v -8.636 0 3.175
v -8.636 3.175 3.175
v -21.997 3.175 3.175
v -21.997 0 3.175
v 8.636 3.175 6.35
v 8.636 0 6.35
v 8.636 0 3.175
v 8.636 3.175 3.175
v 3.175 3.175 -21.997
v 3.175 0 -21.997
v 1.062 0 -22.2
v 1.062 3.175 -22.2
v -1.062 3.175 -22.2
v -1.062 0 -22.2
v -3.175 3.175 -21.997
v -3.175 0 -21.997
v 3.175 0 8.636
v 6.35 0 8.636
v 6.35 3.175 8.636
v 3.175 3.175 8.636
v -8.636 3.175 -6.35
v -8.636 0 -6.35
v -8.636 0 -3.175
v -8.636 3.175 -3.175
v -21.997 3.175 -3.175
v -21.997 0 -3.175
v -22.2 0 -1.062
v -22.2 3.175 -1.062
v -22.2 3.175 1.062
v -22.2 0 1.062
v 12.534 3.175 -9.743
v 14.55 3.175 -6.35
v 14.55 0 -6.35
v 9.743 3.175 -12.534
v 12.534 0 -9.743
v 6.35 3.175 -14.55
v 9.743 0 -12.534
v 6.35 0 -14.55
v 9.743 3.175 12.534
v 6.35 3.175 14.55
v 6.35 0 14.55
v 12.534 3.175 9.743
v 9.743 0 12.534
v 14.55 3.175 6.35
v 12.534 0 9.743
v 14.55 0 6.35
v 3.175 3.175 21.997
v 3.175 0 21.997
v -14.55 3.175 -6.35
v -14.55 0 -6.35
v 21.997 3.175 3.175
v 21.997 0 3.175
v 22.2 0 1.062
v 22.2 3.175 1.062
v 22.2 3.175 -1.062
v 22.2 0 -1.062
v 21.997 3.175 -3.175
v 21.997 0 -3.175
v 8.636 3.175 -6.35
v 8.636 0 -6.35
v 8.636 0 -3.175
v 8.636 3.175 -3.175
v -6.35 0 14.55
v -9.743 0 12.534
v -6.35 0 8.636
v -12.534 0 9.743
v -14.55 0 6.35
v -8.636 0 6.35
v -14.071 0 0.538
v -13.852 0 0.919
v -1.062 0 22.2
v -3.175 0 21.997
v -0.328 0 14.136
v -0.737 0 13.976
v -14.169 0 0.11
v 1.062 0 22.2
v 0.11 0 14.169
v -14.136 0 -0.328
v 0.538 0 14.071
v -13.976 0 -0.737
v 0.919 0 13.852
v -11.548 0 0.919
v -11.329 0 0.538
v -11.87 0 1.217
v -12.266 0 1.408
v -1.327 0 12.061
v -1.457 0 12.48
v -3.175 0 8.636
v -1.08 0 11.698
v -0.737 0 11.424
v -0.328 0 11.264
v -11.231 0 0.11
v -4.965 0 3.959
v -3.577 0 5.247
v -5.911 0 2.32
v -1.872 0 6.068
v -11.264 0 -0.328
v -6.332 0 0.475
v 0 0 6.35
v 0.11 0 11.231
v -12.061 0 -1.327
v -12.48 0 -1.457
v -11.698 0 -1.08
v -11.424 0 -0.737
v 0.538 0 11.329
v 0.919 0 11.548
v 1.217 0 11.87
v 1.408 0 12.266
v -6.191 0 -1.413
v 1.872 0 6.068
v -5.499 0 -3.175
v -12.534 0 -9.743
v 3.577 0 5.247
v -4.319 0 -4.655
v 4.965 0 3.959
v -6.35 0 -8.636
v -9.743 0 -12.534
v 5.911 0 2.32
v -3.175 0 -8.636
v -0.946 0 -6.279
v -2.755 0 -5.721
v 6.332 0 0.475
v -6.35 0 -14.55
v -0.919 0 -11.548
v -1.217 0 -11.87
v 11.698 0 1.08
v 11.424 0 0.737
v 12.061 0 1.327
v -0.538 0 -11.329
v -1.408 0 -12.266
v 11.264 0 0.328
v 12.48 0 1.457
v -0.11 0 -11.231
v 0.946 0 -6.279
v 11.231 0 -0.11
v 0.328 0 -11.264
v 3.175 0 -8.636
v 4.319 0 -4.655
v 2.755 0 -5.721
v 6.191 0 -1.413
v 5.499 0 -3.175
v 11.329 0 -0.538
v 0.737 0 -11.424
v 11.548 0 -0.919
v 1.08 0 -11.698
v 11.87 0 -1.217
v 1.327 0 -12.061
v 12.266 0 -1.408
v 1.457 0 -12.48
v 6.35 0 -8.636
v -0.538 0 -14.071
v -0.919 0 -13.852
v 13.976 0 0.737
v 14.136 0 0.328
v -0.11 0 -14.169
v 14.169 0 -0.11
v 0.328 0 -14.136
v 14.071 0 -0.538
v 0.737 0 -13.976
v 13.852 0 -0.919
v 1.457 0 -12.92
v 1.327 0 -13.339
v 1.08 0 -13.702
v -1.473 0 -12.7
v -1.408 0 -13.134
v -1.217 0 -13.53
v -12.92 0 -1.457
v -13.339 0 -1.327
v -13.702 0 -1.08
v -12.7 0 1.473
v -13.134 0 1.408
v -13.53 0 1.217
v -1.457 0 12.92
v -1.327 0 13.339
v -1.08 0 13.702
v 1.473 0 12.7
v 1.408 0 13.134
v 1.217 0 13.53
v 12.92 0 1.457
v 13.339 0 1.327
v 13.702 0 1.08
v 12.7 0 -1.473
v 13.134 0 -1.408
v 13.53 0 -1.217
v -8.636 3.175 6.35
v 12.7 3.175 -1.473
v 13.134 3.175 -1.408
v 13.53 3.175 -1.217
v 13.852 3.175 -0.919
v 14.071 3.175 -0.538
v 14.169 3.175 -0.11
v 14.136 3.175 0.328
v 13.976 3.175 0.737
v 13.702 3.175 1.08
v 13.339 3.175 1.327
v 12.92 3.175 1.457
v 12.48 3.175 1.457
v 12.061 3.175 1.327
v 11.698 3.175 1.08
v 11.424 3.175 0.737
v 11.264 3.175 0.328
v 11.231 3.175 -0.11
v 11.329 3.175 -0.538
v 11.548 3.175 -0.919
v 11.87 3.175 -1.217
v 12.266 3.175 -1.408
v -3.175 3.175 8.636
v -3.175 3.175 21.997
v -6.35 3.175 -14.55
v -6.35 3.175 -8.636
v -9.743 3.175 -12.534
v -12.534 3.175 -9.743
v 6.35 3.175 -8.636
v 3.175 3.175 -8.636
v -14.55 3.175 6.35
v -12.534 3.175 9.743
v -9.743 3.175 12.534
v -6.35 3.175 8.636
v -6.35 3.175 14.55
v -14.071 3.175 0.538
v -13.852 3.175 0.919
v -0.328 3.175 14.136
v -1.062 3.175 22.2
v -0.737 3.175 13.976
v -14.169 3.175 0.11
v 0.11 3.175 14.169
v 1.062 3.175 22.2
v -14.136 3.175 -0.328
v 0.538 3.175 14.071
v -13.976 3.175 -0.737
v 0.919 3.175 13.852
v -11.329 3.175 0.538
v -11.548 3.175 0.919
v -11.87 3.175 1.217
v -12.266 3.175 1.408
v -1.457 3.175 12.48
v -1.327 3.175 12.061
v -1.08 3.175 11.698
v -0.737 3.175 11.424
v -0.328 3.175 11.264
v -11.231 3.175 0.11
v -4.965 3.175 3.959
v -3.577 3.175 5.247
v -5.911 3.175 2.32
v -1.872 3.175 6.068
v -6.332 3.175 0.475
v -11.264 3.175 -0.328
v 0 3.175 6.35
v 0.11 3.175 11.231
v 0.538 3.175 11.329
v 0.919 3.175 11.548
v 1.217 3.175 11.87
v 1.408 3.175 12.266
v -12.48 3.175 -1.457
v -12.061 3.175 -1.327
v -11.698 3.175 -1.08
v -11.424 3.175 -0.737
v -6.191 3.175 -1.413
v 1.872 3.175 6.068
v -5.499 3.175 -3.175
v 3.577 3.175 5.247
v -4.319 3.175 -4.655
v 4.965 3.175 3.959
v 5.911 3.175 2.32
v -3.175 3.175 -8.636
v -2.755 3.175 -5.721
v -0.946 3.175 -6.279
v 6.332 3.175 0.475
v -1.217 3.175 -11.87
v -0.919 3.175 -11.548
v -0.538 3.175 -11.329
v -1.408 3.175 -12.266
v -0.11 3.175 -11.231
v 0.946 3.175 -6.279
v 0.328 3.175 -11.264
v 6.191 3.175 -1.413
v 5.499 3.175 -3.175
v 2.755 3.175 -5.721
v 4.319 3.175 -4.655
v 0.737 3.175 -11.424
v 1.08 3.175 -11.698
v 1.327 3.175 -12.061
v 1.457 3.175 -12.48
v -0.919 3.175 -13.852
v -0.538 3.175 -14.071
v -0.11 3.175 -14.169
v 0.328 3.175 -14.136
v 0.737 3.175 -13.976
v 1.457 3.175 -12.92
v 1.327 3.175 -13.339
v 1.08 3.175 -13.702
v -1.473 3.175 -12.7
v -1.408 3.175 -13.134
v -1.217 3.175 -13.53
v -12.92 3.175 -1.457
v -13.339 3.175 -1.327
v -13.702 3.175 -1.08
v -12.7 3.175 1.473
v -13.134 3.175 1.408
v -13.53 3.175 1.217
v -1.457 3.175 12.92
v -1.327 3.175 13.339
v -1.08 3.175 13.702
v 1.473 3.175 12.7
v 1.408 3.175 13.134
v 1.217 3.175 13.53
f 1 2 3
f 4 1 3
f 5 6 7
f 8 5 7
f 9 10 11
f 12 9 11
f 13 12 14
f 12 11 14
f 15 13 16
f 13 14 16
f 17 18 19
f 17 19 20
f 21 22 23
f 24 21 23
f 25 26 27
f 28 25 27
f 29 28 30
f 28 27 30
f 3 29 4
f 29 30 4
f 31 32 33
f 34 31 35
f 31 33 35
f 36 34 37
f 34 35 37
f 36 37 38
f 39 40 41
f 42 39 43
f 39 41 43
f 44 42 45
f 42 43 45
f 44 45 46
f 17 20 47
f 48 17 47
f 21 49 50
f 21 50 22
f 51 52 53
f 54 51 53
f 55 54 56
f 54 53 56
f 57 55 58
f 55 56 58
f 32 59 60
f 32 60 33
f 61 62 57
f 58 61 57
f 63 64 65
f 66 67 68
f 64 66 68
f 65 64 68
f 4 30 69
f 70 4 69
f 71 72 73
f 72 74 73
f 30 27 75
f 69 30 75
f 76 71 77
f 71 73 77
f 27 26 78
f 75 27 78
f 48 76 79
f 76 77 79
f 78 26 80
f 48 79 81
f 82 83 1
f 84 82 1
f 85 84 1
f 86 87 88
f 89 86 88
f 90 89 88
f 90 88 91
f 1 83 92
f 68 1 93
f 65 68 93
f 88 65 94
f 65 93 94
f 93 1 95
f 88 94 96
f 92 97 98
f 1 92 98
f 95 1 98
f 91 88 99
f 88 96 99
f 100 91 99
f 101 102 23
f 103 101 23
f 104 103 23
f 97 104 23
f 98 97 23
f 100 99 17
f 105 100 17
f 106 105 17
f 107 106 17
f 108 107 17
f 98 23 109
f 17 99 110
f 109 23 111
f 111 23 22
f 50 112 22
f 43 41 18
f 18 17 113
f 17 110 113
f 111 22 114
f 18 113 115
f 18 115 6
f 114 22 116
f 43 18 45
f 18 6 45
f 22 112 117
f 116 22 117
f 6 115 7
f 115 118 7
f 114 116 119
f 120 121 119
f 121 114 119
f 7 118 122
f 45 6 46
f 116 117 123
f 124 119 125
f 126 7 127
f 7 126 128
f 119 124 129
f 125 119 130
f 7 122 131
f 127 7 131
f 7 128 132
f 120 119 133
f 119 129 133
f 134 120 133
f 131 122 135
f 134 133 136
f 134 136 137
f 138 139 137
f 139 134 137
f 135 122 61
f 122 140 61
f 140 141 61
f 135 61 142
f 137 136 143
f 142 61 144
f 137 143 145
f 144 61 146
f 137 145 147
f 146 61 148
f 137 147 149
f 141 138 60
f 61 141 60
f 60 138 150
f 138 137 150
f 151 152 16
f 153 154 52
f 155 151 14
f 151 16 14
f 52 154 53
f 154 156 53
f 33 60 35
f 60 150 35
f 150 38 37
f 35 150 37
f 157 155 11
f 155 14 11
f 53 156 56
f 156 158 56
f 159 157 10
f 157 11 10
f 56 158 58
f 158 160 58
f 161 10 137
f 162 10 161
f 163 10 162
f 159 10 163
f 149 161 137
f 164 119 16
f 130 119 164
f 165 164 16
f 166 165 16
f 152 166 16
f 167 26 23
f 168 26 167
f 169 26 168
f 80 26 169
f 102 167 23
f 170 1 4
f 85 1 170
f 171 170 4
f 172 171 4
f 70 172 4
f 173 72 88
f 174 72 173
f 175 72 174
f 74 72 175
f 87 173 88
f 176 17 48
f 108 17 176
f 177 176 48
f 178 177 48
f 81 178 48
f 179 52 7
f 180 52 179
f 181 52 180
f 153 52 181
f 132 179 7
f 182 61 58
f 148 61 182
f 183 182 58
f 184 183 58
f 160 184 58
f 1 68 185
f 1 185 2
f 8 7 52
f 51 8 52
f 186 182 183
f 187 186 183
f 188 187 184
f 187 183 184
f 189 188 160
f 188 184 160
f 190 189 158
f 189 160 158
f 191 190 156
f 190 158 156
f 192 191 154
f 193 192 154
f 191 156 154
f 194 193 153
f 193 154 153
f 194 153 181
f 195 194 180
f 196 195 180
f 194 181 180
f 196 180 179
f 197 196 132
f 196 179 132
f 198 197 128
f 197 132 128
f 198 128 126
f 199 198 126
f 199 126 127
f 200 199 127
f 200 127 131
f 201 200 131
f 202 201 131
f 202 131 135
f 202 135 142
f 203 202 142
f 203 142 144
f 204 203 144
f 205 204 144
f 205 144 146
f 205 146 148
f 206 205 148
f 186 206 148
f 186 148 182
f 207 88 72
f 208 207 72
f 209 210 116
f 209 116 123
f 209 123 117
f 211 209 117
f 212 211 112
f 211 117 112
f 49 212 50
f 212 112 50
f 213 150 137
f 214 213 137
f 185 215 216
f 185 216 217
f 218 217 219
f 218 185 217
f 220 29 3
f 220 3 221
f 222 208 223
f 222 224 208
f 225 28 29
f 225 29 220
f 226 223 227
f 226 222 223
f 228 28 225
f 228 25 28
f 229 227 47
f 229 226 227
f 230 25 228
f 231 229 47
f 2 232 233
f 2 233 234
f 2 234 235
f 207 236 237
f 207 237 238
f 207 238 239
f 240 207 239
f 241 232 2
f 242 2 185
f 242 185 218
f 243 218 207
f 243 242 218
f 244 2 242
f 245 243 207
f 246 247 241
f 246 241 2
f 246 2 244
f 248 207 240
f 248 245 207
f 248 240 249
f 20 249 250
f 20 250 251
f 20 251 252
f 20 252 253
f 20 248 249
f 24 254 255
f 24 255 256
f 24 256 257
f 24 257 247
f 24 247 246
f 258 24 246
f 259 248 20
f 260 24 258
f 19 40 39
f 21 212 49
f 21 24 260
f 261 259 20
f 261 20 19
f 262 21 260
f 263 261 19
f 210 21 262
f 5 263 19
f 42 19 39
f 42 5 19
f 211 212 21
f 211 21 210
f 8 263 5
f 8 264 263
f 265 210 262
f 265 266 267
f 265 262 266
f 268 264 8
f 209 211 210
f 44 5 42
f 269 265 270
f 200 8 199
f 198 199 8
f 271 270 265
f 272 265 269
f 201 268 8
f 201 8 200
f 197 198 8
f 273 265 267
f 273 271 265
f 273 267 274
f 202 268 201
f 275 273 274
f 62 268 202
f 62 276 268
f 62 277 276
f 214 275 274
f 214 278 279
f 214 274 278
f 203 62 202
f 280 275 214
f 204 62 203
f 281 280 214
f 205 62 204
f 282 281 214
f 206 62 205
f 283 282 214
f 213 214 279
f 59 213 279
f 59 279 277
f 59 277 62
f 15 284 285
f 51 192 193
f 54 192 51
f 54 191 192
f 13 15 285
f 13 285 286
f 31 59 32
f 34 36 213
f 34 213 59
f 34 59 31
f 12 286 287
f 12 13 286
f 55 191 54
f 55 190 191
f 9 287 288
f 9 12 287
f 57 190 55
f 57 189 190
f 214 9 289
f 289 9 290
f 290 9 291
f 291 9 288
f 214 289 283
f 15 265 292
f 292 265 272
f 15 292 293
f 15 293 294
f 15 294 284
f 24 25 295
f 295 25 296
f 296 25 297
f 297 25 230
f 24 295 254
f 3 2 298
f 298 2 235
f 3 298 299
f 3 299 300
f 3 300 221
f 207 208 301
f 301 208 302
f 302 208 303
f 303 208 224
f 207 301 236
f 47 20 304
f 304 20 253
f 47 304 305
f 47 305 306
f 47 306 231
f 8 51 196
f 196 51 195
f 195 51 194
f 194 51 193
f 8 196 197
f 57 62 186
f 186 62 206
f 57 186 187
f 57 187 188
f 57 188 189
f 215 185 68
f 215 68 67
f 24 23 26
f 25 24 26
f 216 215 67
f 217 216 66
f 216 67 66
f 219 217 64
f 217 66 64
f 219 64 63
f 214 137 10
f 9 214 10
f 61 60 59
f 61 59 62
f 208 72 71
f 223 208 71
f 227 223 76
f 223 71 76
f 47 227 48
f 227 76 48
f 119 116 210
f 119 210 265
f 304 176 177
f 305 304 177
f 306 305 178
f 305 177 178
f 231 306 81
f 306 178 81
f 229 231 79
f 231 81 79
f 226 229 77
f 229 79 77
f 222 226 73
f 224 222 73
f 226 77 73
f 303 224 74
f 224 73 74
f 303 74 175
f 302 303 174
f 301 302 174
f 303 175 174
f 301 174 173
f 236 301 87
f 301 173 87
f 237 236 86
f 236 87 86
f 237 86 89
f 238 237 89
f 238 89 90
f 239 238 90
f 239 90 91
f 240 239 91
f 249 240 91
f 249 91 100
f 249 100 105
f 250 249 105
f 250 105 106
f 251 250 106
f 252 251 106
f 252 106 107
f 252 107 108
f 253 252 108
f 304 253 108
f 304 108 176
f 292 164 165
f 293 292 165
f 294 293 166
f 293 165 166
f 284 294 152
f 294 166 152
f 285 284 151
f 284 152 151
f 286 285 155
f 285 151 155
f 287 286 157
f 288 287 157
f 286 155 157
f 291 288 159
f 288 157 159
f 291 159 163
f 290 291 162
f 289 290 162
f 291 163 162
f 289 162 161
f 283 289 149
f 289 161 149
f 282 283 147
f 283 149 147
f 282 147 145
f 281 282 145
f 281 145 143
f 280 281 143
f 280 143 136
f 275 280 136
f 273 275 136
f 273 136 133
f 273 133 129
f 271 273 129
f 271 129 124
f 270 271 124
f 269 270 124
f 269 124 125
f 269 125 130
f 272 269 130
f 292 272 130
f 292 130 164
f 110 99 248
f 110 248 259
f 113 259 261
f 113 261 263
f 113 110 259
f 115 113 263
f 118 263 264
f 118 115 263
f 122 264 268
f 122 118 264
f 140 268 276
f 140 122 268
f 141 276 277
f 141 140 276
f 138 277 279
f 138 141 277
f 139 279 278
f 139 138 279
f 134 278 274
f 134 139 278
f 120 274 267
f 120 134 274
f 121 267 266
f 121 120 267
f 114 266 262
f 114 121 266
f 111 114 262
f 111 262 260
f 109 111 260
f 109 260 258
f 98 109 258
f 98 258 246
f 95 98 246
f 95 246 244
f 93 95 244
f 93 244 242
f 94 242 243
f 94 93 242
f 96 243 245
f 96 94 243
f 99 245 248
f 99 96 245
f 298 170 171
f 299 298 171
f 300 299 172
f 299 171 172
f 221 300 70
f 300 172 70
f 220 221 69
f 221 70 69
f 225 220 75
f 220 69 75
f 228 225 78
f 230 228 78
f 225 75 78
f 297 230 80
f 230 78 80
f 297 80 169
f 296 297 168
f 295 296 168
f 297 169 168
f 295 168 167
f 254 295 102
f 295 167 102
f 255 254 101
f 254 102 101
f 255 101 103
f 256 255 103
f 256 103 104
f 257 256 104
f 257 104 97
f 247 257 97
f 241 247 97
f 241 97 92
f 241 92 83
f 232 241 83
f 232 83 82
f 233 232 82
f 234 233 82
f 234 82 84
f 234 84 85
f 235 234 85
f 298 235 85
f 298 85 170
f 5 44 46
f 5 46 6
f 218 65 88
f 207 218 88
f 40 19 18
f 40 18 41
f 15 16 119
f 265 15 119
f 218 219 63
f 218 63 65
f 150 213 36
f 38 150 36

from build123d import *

# Parameters (mm, degrees)
SKETCH1_R                   = 6.35
BOSS_EXTRUDE1_DEPTH         = 3.175
F_4_CLEARANCE_HOLE1_D       = 2.9464
CUT_EXTRUDE1_REACH          = 33.591
SKETCH11_W                  = 3.175
SKETCH11_H                  = 6.918259867
CIRPATTERN2_COUNT           = 4
CIRPATTERN2_COPY_1_REACH    = 33.591
CIRPATTERN2_COPY_1_SKETCH_W = 3.175
CIRPATTERN2_COPY_1_SKETCH_H = 6.918259867
CIRPATTERN2_COPY_2_REACH    = 33.591
CIRPATTERN2_COPY_2_SKETCH_W = 3.175
CIRPATTERN2_COPY_2_SKETCH_H = 6.918259867
CIRPATTERN2_COPY_3_REACH    = 33.591
CIRPATTERN2_COPY_3_SKETCH_W = 3.175
CIRPATTERN2_COPY_3_SKETCH_H = 6.918259867
CIRPATTERN2_COPY_4_REACH    = 33.591
CIRPATTERN2_COPY_4_SKETCH_W = 3.175
CIRPATTERN2_COPY_4_SKETCH_H = 6.918259867
CIRPATTERN2_COPY_5_REACH    = 33.591
CIRPATTERN2_COPY_5_SKETCH_W = 3.175
CIRPATTERN2_COPY_5_SKETCH_H = 6.918259867
CIRPATTERN2_COPY_6_REACH    = 33.591
CIRPATTERN2_COPY_6_SKETCH_W = 3.175
CIRPATTERN2_COPY_6_SKETCH_H = 6.918259867


with BuildPart() as part:
    # Sketch1 → Boss-Extrude1 (new body)
    with BuildSketch(Plane(origin=(0, 0, 0), x_dir=(1, 0, 0), z_dir=(0, 1, 0))):
        with BuildLine():
            Line((-3.175, 21.997045256), (-3.175, 15.554259867))
            ThreePointArc((-3.175, 15.554259867), (-11.225320151, 11.225320151), (-15.554259867, 3.175))
            Line((-15.554259867, 3.175), (-21.997045256, 3.175))
            ThreePointArc((-21.997045256, 3.175), (-22.225, 0), (-21.997045256, -3.175))
            Line((-21.997045256, -3.175), (-15.554259867, -3.175))
            ThreePointArc((-15.554259867, -3.175), (-11.225320151, -11.225320151), (-3.175, -15.554259867))
            Line((-3.175, -15.554259867), (-3.175, -21.997045256))
            ThreePointArc((-3.175, -21.997045256), (0, -22.225), (3.175, -21.997045256))
            Line((3.175, -21.997045256), (3.175, -15.554259867))
            ThreePointArc((3.175, -15.554259867), (11.225320151, -11.225320151), (15.554259867, -3.175))
            Line((15.554259867, -3.175), (21.997045256, -3.175))
            ThreePointArc((21.997045256, -3.175), (22.225, 0), (21.997045256, 3.175))
            Line((21.997045256, 3.175), (15.554259867, 3.175))
            ThreePointArc((15.554259867, 3.175), (11.225320151, 11.225320151), (3.175, 15.554259867))
            Line((3.175, 15.554259867), (3.175, 21.997045256))
            ThreePointArc((3.175, 21.997045256), (0, 22.225), (-3.175, 21.997045256))
        make_face()
        with Locations(Location((0, 0, 0), (0, 0, 270))):
            Circle(SKETCH1_R, mode=Mode.SUBTRACT)
    extrude(amount=BOSS_EXTRUDE1_DEPTH)

    # #4 Clearance Hole1 (through all)
    with Locations(Plane(origin=(-5.152902703, 3.175, -13.741681739), x_dir=(1, 0, 0), z_dir=(0, 1, 0))):
        with Locations((5.152902703, -1.041681739)):
            f_4_clearance_hole1 = Hole(F_4_CLEARANCE_HOLE1_D / 2)

    # Sketch11 → Cut-Extrude1 (cut, up to next)
    with BuildSketch(Plane(origin=(0, 3.175, 0), x_dir=(1, 0, 0), z_dir=(0, 1, 0)), mode=Mode.PRIVATE) as cut_extrude1_sk1:
        with Locations((-4.7625, 12.095129934)):
            Rectangle(SKETCH11_W, SKETCH11_H)
    cut_extrude1_tool1 = extrude(cut_extrude1_sk1.sketch, amount=-CUT_EXTRUDE1_REACH, mode=Mode.PRIVATE) & part.part
    cut_extrude1 = cut_extrude1_tool1.solids().sort_by_distance((-4.7625, 3.175, -12.09513))[0]
    add(cut_extrude1, mode=Mode.SUBTRACT)

    # Mirror1: Cut-Extrude1 across plane
    add(cut_extrude1.mirror(Plane(origin=(0, 0, 0), x_dir=(0, 0, 1), z_dir=(1, 0, 0))), mode=Mode.SUBTRACT)

    # CirPattern2: #4 Clearance Hole1 ×4 about axis
    cirpattern2_axis = Axis((0, 0, 0), (0, 1, 0))
    for i in range(1, CIRPATTERN2_COUNT):
        add(f_4_clearance_hole1.rotate(cirpattern2_axis, i * 360 / CIRPATTERN2_COUNT), mode=Mode.SUBTRACT)

    # CirPattern2 copy 1 sketch → CirPattern2 copy 1 (cut, up to next)
    with BuildSketch(Plane.ZX.offset(3.175), mode=Mode.PRIVATE) as cirpattern2_copy_1_sk1:
        with Locations((-4.7625, -12.095129934)):
            Rectangle(CIRPATTERN2_COPY_1_SKETCH_W, CIRPATTERN2_COPY_1_SKETCH_H)
    cirpattern2_copy_1_tool1 = extrude(cirpattern2_copy_1_sk1.sketch, amount=-CIRPATTERN2_COPY_1_REACH, mode=Mode.PRIVATE) & part.part
    add(cirpattern2_copy_1_tool1.solids().sort_by_distance((-12.09513, 3.175, -4.7625))[0], mode=Mode.SUBTRACT)

    # CirPattern2 copy 2 sketch → CirPattern2 copy 2 (cut, up to next)
    with BuildSketch(Plane(origin=(0, 3.175, 0), x_dir=(1, 0, 0), z_dir=(0, 1, 0)), mode=Mode.PRIVATE) as cirpattern2_copy_2_sk1:
        with Locations((-4.7625, -12.095129934)):
            Rectangle(CIRPATTERN2_COPY_2_SKETCH_W, CIRPATTERN2_COPY_2_SKETCH_H)
    cirpattern2_copy_2_tool1 = extrude(cirpattern2_copy_2_sk1.sketch, amount=-CIRPATTERN2_COPY_2_REACH, mode=Mode.PRIVATE) & part.part
    add(cirpattern2_copy_2_tool1.solids().sort_by_distance((-4.7625, 3.175, 12.09513))[0], mode=Mode.SUBTRACT)

    # CirPattern2 copy 3 sketch → CirPattern2 copy 3 (cut, up to next)
    with BuildSketch(Plane(origin=(0, 3.175, 0), x_dir=(0, 0, -1), z_dir=(0, 1, 0)), mode=Mode.PRIVATE) as cirpattern2_copy_3_sk1:
        with Locations((-4.7625, -12.095129934)):
            Rectangle(CIRPATTERN2_COPY_3_SKETCH_W, CIRPATTERN2_COPY_3_SKETCH_H)
    cirpattern2_copy_3_tool1 = extrude(cirpattern2_copy_3_sk1.sketch, amount=-CIRPATTERN2_COPY_3_REACH, mode=Mode.PRIVATE) & part.part
    add(cirpattern2_copy_3_tool1.solids().sort_by_distance((12.09513, 3.175, 4.7625))[0], mode=Mode.SUBTRACT)

    # CirPattern2 copy 4 sketch → CirPattern2 copy 4 (cut, up to next)
    with BuildSketch(Plane(origin=(0, 3.175, 0), x_dir=(0, 0, -1), z_dir=(0, 1, 0)), mode=Mode.PRIVATE) as cirpattern2_copy_4_sk1:
        with Locations((-4.7625, 12.095129934)):
            Rectangle(CIRPATTERN2_COPY_4_SKETCH_W, CIRPATTERN2_COPY_4_SKETCH_H)
    cirpattern2_copy_4_tool1 = extrude(cirpattern2_copy_4_sk1.sketch, amount=-CIRPATTERN2_COPY_4_REACH, mode=Mode.PRIVATE) & part.part
    add(cirpattern2_copy_4_tool1.solids().sort_by_distance((-12.09513, 3.175, 4.7625))[0], mode=Mode.SUBTRACT)

    # CirPattern2 copy 5 sketch → CirPattern2 copy 5 (cut, up to next)
    with BuildSketch(Plane(origin=(0, 3.175, 0), x_dir=(-1, 0, 0), z_dir=(0, 1, 0)), mode=Mode.PRIVATE) as cirpattern2_copy_5_sk1:
        with Locations((-4.7625, 12.095129934)):
            Rectangle(CIRPATTERN2_COPY_5_SKETCH_W, CIRPATTERN2_COPY_5_SKETCH_H)
    cirpattern2_copy_5_tool1 = extrude(cirpattern2_copy_5_sk1.sketch, amount=-CIRPATTERN2_COPY_5_REACH, mode=Mode.PRIVATE) & part.part
    add(cirpattern2_copy_5_tool1.solids().sort_by_distance((4.7625, 3.175, 12.09513))[0], mode=Mode.SUBTRACT)

    # CirPattern2 copy 6 sketch → CirPattern2 copy 6 (cut, up to next)
    with BuildSketch(Plane.ZX.offset(3.175), mode=Mode.PRIVATE) as cirpattern2_copy_6_sk1:
        with Locations((-4.7625, 12.095129934)):
            Rectangle(CIRPATTERN2_COPY_6_SKETCH_W, CIRPATTERN2_COPY_6_SKETCH_H)
    cirpattern2_copy_6_tool1 = extrude(cirpattern2_copy_6_sk1.sketch, amount=-CIRPATTERN2_COPY_6_REACH, mode=Mode.PRIVATE) & part.part
    add(cirpattern2_copy_6_tool1.solids().sort_by_distance((12.09513, 3.175, -4.7625))[0], mode=Mode.SUBTRACT)


solid = part.part
